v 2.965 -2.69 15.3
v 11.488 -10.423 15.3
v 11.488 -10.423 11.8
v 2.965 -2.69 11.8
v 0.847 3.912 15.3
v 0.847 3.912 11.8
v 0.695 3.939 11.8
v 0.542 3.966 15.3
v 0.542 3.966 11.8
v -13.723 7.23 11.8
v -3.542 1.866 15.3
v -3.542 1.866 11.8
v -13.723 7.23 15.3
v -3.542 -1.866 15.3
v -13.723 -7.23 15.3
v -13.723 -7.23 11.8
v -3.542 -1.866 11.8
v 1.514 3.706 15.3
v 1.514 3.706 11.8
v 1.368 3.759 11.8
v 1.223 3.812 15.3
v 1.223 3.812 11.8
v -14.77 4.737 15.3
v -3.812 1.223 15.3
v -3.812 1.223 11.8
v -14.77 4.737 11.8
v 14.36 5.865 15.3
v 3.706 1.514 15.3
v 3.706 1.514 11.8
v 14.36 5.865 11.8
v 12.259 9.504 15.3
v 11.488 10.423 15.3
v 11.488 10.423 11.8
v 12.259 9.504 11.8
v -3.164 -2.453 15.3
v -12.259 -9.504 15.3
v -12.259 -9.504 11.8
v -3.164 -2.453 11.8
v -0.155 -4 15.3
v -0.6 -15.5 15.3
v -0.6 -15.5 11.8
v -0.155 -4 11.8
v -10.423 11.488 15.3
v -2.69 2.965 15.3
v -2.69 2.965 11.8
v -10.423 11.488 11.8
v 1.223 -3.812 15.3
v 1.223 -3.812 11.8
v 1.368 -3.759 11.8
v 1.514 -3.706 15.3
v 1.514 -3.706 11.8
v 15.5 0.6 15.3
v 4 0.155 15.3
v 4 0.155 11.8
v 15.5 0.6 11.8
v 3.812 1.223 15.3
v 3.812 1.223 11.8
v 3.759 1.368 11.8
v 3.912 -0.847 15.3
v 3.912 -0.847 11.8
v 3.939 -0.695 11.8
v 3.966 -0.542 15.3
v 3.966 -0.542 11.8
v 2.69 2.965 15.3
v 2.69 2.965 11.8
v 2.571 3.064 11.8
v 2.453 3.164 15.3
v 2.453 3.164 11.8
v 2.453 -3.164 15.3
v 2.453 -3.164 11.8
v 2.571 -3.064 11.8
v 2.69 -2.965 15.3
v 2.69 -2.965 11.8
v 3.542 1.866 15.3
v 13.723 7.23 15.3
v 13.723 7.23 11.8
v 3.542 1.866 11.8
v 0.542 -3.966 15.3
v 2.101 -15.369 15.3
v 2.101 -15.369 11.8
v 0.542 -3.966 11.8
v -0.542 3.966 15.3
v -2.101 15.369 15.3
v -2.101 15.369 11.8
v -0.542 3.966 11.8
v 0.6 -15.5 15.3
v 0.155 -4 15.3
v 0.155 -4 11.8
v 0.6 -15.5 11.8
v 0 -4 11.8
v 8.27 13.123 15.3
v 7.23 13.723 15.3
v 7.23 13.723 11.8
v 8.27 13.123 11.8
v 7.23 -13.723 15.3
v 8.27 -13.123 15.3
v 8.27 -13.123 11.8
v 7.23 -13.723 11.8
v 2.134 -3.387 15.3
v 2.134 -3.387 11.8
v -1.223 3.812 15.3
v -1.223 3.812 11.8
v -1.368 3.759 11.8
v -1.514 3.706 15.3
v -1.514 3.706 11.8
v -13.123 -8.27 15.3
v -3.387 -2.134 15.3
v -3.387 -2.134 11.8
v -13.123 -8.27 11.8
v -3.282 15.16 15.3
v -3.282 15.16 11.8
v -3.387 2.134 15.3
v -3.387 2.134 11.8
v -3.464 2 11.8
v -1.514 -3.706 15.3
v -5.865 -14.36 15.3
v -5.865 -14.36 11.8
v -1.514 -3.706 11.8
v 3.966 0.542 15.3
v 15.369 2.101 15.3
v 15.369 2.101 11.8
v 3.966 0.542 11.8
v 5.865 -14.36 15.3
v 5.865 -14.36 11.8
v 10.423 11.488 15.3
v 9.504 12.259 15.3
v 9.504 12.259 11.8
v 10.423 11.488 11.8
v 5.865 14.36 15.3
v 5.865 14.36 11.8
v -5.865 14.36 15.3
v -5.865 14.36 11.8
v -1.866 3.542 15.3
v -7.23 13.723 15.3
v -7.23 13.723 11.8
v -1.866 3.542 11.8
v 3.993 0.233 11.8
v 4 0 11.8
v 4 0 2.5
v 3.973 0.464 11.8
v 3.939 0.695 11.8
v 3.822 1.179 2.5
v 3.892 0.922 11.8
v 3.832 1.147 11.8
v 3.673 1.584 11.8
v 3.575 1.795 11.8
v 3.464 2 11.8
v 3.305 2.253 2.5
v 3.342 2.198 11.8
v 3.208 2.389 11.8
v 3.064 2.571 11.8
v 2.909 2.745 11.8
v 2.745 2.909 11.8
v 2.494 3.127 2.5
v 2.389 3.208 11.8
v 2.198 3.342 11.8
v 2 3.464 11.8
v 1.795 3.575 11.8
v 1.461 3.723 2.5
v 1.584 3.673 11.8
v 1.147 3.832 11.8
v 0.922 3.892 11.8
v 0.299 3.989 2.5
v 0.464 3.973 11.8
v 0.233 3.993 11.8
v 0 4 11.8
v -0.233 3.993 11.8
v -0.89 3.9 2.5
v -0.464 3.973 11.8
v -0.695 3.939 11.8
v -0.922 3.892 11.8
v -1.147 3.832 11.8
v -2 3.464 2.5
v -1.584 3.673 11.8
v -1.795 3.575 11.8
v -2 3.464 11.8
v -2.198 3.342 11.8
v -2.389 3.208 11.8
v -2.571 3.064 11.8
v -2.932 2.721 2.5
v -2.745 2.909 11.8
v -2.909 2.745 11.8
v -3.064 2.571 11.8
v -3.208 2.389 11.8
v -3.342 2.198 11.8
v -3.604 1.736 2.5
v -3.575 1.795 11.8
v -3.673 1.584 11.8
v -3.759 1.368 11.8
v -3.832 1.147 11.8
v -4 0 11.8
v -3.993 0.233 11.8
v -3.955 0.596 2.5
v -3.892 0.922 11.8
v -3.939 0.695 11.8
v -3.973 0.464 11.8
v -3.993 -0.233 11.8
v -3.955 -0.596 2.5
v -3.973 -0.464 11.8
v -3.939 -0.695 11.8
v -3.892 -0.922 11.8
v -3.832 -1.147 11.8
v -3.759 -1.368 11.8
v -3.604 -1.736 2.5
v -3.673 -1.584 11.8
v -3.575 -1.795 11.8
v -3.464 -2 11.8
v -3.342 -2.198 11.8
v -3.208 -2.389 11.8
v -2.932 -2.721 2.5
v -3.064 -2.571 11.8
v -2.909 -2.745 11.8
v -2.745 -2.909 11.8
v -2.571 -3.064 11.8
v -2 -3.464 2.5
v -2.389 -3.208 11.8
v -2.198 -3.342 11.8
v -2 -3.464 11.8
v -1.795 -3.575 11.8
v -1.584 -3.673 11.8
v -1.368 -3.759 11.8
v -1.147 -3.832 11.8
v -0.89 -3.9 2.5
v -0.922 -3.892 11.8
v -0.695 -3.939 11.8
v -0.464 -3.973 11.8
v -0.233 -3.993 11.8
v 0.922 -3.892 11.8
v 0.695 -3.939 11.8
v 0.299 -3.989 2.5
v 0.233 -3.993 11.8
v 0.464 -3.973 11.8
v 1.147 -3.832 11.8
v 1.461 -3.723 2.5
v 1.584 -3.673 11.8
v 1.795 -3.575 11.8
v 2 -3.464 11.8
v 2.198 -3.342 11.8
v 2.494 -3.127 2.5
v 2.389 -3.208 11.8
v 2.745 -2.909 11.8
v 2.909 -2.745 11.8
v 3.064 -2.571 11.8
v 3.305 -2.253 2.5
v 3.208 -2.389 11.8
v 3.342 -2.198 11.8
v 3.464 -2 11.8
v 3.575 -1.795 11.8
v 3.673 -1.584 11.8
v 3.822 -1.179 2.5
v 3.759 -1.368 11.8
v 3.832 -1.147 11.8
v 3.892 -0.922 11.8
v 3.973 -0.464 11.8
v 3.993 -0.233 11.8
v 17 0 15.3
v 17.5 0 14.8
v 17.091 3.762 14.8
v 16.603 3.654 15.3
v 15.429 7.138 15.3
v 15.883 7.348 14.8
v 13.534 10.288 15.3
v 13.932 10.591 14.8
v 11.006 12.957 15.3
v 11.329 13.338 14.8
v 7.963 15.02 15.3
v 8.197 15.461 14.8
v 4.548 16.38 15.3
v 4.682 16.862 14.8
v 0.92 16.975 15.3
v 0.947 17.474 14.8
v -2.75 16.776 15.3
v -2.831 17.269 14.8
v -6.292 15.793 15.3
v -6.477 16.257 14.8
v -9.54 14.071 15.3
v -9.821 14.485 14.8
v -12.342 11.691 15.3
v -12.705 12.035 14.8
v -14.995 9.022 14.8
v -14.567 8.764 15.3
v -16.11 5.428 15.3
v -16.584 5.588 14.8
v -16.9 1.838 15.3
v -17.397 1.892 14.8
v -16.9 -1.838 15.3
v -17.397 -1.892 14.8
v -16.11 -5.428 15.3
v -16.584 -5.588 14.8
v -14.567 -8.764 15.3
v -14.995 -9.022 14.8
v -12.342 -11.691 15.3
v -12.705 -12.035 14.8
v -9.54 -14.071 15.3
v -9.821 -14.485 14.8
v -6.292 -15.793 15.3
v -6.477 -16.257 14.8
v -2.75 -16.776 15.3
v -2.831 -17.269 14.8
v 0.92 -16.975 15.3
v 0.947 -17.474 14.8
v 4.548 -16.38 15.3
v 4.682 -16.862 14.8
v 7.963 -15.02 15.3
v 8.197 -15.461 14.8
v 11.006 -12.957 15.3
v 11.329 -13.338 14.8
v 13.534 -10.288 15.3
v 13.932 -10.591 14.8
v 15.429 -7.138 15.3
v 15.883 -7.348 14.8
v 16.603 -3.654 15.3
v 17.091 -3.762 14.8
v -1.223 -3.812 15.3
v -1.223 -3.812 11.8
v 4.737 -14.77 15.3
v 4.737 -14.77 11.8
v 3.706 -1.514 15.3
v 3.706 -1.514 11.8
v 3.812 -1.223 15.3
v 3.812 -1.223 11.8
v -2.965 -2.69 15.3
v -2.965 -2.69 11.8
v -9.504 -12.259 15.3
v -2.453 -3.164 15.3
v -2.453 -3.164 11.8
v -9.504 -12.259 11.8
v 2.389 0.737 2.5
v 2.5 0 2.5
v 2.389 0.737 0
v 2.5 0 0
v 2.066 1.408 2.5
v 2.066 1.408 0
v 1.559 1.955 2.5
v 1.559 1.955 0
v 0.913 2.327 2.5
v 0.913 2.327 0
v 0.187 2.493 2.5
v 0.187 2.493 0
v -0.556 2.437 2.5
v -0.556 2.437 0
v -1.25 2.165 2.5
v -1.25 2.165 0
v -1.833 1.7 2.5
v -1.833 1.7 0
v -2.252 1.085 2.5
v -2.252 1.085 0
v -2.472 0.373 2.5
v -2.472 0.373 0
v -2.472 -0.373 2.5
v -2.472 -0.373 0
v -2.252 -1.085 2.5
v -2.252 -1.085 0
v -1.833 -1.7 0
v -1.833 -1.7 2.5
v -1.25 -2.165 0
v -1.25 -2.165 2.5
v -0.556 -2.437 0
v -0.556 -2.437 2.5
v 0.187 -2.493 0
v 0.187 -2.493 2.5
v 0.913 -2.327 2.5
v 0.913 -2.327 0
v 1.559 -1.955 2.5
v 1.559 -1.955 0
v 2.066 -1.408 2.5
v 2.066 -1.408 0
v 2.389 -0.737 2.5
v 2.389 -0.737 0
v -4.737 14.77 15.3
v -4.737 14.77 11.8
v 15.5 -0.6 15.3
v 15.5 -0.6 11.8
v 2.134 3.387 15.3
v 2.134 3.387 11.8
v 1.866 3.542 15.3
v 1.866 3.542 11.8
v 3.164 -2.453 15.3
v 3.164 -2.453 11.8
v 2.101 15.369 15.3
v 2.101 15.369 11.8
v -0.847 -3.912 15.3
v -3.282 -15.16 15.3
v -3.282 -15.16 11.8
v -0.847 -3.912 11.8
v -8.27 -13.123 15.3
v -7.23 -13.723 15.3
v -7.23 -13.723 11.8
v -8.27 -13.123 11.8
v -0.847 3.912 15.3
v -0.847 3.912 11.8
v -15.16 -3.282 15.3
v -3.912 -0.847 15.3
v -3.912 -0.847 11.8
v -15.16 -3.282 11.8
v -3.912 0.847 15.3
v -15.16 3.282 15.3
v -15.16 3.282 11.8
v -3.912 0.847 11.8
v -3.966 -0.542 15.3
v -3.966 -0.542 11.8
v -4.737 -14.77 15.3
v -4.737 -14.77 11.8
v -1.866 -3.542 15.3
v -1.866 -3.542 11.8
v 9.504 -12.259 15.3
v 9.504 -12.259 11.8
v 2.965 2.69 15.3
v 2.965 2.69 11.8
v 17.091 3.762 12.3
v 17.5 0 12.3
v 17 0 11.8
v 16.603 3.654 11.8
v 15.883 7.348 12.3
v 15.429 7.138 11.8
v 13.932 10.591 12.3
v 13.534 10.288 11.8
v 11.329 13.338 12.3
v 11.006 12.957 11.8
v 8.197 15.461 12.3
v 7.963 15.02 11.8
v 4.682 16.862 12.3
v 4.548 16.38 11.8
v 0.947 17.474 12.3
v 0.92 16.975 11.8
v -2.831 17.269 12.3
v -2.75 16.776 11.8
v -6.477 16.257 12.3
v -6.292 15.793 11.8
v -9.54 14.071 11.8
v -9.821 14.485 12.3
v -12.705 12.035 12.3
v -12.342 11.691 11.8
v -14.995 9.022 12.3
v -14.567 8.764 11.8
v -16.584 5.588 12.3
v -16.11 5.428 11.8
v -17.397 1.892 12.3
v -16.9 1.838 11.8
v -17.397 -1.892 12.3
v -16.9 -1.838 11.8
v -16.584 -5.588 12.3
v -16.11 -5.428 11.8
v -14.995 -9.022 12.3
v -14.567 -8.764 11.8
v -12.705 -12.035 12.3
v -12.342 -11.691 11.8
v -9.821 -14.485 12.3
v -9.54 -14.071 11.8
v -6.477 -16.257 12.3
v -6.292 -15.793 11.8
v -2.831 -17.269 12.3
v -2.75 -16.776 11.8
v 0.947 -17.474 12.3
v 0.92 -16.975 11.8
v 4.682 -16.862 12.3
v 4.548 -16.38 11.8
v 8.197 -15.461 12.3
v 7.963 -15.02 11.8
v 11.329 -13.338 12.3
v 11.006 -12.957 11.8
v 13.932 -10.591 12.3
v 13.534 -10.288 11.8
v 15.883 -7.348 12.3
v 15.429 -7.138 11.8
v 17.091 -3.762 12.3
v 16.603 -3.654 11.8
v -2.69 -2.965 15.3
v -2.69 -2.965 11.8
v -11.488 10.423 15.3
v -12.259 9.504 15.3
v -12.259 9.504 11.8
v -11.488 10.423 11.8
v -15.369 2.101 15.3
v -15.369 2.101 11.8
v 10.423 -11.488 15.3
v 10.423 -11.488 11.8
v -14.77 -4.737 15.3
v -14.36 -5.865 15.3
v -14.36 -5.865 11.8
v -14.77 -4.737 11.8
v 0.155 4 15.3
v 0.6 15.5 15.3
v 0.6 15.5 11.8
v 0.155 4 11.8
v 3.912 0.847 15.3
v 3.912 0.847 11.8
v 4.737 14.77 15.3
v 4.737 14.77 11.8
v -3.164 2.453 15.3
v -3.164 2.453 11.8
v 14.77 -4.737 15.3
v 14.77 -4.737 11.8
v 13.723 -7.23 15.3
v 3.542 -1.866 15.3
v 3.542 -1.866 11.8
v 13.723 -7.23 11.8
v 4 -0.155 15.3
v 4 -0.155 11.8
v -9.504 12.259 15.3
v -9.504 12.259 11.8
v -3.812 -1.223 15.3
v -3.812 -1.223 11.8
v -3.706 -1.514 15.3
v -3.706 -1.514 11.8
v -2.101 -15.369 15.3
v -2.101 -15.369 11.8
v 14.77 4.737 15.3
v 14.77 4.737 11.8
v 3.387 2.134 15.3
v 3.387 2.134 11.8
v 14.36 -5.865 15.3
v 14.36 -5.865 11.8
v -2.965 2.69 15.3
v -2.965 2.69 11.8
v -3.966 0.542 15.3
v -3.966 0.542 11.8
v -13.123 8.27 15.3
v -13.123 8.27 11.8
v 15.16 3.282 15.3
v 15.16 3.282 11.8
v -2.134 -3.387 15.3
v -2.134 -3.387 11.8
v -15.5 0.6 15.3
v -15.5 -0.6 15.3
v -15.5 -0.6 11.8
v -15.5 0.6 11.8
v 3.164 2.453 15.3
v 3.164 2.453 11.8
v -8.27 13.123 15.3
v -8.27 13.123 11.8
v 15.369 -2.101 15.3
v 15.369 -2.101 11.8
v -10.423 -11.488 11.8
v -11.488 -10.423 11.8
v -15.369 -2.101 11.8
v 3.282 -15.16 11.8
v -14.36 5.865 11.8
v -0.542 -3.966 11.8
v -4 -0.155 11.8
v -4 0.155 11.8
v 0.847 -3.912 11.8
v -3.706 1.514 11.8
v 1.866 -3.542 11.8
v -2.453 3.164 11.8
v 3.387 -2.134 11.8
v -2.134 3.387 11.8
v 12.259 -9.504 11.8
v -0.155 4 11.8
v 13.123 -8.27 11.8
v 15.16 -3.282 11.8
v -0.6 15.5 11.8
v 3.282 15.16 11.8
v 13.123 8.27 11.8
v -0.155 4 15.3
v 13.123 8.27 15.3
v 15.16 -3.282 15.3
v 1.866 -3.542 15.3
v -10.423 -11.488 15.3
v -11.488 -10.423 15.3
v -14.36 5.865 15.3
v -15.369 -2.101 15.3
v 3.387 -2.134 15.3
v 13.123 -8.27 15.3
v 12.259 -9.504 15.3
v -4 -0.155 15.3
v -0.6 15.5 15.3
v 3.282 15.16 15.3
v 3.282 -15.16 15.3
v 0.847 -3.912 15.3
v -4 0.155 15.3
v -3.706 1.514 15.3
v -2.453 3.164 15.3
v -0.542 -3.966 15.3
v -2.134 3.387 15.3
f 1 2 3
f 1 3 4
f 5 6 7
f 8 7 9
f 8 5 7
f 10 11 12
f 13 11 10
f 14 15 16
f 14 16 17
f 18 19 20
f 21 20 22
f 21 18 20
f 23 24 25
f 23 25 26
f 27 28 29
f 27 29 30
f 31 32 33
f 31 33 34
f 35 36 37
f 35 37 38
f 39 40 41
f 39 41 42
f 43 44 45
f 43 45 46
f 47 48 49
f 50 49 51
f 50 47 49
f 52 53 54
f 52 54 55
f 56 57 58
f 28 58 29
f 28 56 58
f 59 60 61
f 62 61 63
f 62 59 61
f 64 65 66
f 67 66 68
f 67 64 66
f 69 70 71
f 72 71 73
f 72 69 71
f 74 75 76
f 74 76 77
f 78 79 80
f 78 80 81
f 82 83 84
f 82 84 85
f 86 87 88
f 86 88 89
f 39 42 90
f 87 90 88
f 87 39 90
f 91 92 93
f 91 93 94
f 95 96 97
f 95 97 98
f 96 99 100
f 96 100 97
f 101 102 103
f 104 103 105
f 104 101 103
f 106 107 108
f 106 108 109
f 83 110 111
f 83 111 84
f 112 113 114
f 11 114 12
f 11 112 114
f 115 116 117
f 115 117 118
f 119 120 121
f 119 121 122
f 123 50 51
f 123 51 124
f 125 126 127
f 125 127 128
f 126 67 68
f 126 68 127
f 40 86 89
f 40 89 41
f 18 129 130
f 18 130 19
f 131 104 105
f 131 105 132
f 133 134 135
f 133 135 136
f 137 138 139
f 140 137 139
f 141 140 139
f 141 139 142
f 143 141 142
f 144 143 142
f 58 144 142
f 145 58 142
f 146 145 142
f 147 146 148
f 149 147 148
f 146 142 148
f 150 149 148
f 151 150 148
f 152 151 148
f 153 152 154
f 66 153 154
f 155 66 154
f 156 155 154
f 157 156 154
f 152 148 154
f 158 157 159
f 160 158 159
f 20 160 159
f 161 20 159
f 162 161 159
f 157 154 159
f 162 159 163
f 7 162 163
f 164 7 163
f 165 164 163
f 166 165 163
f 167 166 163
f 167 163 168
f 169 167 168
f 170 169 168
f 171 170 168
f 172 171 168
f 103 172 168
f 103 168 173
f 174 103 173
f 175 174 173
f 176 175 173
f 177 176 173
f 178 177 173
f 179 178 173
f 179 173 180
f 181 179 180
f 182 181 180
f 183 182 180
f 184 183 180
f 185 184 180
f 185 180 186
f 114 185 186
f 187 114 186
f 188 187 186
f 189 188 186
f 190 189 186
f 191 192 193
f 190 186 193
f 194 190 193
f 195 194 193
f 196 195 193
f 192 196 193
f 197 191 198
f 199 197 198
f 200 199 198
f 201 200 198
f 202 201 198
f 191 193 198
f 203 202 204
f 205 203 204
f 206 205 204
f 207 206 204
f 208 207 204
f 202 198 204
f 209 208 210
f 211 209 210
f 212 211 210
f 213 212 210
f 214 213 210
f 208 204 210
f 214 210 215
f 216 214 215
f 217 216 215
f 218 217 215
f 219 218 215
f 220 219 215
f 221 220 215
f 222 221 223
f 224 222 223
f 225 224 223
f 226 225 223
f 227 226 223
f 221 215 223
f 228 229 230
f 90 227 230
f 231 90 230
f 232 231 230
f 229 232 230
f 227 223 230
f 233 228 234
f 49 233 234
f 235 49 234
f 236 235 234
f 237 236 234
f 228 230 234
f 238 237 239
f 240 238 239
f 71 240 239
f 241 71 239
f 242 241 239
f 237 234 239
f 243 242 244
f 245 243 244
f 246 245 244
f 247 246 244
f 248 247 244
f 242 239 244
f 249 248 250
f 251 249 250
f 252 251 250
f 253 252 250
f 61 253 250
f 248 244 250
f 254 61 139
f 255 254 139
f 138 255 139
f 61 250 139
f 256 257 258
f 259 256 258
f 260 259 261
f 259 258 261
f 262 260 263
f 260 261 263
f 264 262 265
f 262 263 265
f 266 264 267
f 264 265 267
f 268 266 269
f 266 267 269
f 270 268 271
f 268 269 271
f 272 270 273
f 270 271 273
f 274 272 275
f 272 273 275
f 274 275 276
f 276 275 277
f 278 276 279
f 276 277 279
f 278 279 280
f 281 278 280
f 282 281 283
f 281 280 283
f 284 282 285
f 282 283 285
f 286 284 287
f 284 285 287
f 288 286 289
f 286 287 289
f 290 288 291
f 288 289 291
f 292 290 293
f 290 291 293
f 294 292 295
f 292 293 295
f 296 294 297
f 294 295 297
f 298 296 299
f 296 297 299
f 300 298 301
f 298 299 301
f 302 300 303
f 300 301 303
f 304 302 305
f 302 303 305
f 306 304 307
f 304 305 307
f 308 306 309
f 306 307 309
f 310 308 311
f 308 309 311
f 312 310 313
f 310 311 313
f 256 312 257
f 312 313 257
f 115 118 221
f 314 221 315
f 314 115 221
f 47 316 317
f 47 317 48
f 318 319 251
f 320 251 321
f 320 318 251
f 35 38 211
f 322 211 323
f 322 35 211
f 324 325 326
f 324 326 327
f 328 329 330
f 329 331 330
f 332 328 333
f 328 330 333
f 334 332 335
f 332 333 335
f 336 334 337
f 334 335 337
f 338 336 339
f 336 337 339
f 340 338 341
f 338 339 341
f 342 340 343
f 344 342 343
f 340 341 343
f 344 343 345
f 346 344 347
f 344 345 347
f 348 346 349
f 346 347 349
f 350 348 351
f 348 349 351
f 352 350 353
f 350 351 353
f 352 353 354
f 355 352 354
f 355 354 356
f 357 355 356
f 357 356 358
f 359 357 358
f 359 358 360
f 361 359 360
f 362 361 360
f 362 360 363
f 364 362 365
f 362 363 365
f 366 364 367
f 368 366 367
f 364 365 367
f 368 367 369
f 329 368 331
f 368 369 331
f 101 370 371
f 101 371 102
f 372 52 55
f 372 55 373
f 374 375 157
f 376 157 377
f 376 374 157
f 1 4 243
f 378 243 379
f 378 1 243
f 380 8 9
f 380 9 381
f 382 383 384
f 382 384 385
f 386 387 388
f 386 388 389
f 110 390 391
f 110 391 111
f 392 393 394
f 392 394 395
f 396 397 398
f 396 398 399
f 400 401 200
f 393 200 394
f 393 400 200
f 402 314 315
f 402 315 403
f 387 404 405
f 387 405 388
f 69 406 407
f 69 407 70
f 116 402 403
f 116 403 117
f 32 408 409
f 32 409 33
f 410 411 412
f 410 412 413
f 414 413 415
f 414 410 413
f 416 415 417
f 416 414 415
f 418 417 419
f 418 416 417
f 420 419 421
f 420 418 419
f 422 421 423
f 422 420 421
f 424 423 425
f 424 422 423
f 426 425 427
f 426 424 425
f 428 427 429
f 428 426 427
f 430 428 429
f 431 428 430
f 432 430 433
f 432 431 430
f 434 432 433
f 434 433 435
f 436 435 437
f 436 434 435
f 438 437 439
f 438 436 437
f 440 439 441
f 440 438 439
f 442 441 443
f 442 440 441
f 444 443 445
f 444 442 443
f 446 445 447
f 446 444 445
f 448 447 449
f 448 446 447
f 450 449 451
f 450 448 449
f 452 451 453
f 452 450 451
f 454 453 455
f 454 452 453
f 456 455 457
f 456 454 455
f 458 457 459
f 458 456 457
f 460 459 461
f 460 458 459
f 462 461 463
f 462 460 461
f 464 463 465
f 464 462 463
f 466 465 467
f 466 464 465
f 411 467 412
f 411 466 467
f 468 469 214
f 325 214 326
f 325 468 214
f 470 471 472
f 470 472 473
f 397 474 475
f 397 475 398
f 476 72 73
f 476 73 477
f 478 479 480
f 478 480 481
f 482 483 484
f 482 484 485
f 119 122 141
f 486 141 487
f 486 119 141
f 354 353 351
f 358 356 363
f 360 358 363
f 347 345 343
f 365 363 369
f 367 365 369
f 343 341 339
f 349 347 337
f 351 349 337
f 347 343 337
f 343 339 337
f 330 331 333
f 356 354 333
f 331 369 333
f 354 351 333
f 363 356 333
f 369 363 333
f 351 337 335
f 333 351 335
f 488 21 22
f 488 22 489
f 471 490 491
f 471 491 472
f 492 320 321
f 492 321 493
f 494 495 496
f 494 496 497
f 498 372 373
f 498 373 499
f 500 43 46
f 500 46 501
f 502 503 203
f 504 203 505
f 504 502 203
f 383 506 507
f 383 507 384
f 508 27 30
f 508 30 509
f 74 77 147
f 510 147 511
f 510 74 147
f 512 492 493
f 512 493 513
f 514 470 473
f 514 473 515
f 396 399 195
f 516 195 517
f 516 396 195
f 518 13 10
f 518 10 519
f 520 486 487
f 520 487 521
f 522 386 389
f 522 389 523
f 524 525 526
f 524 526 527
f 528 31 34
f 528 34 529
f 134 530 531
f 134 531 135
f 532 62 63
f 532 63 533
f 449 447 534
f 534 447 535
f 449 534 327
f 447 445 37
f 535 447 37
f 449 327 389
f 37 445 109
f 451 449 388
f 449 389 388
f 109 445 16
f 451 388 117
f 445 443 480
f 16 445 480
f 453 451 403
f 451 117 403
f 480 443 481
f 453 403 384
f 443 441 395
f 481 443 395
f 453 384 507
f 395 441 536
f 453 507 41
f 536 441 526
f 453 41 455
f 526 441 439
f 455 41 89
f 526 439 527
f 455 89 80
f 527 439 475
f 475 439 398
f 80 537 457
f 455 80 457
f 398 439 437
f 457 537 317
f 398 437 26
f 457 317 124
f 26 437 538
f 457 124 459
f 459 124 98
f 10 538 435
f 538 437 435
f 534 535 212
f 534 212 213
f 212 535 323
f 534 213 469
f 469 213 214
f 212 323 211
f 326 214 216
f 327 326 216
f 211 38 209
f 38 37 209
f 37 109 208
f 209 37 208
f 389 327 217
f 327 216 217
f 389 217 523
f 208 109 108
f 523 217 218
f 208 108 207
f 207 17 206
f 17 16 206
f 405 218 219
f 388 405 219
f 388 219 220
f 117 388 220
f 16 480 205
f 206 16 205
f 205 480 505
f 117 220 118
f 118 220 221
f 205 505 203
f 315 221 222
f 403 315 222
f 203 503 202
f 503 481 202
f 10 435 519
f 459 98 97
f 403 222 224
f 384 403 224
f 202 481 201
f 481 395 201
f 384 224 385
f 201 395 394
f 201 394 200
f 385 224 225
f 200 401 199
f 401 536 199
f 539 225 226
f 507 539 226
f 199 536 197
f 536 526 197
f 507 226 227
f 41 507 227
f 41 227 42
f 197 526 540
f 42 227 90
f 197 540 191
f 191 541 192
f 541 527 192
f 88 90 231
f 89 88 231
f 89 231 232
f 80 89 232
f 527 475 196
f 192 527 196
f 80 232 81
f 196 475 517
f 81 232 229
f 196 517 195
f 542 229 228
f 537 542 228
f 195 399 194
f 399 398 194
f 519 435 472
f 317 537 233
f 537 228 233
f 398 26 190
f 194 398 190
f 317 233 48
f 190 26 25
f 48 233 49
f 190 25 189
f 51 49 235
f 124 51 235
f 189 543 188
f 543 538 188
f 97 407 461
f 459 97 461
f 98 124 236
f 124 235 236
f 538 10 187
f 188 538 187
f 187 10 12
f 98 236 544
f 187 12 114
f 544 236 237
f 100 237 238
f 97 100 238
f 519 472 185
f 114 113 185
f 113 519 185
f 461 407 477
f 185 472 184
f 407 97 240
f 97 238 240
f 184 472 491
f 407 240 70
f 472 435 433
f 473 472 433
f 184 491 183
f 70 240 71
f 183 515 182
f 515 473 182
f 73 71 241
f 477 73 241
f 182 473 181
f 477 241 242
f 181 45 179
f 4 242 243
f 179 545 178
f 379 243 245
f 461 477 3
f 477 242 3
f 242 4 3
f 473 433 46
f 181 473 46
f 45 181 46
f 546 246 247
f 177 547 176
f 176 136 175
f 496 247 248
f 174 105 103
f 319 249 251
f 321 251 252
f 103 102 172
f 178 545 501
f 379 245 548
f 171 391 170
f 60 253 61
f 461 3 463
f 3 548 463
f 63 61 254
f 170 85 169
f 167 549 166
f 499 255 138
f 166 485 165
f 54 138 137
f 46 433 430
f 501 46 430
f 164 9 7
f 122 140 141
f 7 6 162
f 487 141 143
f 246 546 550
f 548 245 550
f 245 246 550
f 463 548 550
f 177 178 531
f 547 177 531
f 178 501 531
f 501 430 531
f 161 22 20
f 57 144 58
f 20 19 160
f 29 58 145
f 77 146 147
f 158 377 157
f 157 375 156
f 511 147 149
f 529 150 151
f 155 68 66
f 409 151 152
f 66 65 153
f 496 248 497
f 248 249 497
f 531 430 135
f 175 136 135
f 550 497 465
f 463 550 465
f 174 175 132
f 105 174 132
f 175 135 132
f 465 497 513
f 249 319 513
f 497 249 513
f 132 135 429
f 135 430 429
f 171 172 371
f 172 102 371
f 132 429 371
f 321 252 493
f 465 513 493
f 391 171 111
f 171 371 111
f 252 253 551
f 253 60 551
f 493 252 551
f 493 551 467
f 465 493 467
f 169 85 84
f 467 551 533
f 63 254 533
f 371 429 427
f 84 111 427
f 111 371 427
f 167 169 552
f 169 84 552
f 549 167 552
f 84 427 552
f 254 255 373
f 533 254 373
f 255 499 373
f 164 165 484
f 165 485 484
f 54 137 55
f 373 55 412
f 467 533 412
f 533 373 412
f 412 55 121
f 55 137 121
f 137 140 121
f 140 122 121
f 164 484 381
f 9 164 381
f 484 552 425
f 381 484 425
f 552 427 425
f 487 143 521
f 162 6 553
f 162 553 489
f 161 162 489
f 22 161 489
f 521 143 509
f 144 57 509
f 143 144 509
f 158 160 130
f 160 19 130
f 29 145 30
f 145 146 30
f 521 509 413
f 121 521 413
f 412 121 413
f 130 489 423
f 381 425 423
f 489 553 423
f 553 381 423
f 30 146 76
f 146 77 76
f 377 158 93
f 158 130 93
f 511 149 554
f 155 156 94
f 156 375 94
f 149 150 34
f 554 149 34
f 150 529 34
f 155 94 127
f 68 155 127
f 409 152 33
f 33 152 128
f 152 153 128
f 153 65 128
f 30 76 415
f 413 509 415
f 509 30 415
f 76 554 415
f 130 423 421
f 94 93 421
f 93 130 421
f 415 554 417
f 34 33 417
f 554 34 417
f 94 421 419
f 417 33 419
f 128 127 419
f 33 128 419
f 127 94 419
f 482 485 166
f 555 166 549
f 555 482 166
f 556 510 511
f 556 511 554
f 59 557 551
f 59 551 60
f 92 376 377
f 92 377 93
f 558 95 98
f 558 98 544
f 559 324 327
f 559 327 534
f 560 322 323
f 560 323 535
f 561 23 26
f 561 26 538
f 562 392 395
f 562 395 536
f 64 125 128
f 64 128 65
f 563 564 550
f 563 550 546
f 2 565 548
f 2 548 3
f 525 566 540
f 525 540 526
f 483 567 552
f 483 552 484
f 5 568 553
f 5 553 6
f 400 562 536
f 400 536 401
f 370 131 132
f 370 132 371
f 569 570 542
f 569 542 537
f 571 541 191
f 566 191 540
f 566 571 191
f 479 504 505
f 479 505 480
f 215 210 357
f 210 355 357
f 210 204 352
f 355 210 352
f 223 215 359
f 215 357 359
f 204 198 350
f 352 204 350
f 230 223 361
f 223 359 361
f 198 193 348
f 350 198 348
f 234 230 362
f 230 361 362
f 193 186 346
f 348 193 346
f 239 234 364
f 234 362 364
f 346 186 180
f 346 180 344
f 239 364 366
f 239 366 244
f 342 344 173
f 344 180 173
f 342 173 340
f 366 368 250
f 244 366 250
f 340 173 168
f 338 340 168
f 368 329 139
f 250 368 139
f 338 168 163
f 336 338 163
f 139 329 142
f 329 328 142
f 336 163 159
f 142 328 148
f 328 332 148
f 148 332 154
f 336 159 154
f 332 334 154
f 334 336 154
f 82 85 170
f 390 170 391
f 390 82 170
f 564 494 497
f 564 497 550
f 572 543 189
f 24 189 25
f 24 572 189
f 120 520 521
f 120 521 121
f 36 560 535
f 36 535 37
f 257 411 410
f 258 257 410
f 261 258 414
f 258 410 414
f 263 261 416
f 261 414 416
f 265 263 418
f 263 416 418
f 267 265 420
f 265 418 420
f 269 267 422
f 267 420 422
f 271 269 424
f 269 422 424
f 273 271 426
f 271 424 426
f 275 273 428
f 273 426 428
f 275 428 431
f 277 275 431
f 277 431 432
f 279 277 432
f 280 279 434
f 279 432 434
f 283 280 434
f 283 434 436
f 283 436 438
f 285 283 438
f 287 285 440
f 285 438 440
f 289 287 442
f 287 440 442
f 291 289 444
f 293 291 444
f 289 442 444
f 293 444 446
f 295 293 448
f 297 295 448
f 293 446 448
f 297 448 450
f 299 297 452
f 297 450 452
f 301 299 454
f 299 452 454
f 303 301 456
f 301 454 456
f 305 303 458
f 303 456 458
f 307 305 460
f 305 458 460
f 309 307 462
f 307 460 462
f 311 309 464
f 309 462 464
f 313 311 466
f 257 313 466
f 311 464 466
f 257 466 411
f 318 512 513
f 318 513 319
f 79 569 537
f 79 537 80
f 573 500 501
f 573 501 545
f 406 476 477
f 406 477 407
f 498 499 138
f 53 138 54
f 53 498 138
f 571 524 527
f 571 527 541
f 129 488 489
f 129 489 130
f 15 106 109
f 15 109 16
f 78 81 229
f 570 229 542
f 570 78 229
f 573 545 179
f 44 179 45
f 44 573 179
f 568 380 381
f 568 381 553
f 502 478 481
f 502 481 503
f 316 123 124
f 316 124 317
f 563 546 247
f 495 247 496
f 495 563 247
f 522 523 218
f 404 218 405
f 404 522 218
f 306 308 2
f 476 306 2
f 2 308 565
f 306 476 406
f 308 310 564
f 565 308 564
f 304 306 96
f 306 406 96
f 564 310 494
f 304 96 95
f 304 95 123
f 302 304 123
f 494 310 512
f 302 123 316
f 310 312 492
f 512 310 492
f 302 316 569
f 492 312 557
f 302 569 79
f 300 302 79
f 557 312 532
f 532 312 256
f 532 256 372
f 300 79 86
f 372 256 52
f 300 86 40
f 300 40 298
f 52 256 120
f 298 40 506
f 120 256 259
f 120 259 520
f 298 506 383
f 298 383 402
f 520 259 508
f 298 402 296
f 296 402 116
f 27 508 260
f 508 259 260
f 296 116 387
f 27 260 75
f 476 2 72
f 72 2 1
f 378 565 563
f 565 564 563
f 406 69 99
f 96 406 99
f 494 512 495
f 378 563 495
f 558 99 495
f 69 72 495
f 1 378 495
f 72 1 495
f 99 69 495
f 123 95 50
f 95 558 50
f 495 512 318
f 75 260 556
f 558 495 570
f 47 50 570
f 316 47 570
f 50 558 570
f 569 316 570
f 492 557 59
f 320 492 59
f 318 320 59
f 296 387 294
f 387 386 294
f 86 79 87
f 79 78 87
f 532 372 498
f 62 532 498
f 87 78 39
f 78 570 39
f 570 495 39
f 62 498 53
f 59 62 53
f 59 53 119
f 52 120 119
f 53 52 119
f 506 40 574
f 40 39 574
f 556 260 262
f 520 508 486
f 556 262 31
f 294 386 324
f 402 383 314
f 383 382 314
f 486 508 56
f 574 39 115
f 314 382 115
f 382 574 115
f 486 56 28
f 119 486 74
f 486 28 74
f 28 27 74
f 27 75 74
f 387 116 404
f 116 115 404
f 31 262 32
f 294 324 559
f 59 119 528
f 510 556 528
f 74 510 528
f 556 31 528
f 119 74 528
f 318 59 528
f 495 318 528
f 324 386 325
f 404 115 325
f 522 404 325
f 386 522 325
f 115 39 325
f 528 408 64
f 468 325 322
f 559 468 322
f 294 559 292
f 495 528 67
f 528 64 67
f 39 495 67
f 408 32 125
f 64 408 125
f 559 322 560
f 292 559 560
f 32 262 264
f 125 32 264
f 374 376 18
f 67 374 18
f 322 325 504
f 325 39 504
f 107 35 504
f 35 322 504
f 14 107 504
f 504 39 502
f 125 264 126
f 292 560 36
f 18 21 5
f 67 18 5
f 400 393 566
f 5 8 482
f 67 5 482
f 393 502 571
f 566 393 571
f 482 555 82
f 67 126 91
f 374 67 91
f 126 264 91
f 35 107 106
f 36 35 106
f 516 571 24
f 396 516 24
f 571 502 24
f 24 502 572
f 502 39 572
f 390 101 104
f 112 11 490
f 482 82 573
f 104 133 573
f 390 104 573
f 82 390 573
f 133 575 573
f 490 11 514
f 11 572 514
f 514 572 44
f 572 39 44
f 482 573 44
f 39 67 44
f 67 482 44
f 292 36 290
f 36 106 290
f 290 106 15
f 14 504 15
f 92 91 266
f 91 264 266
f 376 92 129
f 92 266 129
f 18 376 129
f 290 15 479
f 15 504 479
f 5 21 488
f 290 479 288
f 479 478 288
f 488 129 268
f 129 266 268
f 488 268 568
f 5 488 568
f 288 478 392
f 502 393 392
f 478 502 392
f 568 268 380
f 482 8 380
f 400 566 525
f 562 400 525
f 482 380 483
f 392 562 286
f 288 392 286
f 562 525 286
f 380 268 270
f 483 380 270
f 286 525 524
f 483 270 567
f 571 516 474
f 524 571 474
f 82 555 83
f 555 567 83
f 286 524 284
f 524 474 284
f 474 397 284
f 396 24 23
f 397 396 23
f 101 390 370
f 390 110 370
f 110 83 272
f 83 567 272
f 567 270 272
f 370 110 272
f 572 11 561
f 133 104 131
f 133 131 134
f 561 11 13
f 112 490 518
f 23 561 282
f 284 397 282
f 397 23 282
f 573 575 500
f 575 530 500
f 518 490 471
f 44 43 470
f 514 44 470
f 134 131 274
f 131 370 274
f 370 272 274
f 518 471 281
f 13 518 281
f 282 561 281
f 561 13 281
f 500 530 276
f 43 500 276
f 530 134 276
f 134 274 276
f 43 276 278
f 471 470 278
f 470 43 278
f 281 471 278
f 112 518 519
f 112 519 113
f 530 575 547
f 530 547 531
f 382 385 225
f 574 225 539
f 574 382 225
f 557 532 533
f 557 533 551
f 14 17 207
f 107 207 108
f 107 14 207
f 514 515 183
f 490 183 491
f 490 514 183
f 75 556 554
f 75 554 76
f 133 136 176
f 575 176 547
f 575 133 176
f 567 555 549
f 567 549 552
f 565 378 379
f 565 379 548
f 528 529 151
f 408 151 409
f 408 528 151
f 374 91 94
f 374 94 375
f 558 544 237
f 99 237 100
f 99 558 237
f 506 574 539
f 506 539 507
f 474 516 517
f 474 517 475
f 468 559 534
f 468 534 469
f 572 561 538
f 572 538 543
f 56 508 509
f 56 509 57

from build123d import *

# Parameters (mm, degrees)
POCKET_DEPTH       = 118.917408
POLARPATTERN_COUNT = 36
CHAMFER_SIZE       = 0.5


with BuildPart() as part:
    # Sketch → Revolution (revolve)
    with BuildSketch(Plane.XZ):
        Polygon((0, 0), (0, 15.3), (17.5, 15.3), (17.5, 11.8), (4, 11.8), (4, 2.5), (2.5, 2.5), (2.5, 0), align=None)
    revolve(axis=Axis((0, 0, 0), (0, 0, 1)))

    # Sketch001 → Pocket (cut, through all)
    with BuildSketch(Plane.XY.offset(15.3)):
        Polygon((-0.154839, 4), (-0.6, 15.5), (0.6, 15.5), (0.154839, 4), align=None)
    pocket = extrude(amount=-POCKET_DEPTH, mode=Mode.SUBTRACT)

    # PolarPattern: Pocket ×36 about axis
    polarpattern_axis = Axis((0, 0, 15.3), (0, 0, 1))
    for i in range(1, POLARPATTERN_COUNT):
        add(pocket.rotate(polarpattern_axis, i * 360 / POLARPATTERN_COUNT), mode=Mode.SUBTRACT)

    # Chamfer
    chamfer_edges = [part.edges().sort_by_distance(p)[0] for p in [
        (-17.5, 0, 11.8),
        (-17.5, 0, 15.3),
    ]]
    chamfer(chamfer_edges, length=CHAMFER_SIZE)


solid = part.part
